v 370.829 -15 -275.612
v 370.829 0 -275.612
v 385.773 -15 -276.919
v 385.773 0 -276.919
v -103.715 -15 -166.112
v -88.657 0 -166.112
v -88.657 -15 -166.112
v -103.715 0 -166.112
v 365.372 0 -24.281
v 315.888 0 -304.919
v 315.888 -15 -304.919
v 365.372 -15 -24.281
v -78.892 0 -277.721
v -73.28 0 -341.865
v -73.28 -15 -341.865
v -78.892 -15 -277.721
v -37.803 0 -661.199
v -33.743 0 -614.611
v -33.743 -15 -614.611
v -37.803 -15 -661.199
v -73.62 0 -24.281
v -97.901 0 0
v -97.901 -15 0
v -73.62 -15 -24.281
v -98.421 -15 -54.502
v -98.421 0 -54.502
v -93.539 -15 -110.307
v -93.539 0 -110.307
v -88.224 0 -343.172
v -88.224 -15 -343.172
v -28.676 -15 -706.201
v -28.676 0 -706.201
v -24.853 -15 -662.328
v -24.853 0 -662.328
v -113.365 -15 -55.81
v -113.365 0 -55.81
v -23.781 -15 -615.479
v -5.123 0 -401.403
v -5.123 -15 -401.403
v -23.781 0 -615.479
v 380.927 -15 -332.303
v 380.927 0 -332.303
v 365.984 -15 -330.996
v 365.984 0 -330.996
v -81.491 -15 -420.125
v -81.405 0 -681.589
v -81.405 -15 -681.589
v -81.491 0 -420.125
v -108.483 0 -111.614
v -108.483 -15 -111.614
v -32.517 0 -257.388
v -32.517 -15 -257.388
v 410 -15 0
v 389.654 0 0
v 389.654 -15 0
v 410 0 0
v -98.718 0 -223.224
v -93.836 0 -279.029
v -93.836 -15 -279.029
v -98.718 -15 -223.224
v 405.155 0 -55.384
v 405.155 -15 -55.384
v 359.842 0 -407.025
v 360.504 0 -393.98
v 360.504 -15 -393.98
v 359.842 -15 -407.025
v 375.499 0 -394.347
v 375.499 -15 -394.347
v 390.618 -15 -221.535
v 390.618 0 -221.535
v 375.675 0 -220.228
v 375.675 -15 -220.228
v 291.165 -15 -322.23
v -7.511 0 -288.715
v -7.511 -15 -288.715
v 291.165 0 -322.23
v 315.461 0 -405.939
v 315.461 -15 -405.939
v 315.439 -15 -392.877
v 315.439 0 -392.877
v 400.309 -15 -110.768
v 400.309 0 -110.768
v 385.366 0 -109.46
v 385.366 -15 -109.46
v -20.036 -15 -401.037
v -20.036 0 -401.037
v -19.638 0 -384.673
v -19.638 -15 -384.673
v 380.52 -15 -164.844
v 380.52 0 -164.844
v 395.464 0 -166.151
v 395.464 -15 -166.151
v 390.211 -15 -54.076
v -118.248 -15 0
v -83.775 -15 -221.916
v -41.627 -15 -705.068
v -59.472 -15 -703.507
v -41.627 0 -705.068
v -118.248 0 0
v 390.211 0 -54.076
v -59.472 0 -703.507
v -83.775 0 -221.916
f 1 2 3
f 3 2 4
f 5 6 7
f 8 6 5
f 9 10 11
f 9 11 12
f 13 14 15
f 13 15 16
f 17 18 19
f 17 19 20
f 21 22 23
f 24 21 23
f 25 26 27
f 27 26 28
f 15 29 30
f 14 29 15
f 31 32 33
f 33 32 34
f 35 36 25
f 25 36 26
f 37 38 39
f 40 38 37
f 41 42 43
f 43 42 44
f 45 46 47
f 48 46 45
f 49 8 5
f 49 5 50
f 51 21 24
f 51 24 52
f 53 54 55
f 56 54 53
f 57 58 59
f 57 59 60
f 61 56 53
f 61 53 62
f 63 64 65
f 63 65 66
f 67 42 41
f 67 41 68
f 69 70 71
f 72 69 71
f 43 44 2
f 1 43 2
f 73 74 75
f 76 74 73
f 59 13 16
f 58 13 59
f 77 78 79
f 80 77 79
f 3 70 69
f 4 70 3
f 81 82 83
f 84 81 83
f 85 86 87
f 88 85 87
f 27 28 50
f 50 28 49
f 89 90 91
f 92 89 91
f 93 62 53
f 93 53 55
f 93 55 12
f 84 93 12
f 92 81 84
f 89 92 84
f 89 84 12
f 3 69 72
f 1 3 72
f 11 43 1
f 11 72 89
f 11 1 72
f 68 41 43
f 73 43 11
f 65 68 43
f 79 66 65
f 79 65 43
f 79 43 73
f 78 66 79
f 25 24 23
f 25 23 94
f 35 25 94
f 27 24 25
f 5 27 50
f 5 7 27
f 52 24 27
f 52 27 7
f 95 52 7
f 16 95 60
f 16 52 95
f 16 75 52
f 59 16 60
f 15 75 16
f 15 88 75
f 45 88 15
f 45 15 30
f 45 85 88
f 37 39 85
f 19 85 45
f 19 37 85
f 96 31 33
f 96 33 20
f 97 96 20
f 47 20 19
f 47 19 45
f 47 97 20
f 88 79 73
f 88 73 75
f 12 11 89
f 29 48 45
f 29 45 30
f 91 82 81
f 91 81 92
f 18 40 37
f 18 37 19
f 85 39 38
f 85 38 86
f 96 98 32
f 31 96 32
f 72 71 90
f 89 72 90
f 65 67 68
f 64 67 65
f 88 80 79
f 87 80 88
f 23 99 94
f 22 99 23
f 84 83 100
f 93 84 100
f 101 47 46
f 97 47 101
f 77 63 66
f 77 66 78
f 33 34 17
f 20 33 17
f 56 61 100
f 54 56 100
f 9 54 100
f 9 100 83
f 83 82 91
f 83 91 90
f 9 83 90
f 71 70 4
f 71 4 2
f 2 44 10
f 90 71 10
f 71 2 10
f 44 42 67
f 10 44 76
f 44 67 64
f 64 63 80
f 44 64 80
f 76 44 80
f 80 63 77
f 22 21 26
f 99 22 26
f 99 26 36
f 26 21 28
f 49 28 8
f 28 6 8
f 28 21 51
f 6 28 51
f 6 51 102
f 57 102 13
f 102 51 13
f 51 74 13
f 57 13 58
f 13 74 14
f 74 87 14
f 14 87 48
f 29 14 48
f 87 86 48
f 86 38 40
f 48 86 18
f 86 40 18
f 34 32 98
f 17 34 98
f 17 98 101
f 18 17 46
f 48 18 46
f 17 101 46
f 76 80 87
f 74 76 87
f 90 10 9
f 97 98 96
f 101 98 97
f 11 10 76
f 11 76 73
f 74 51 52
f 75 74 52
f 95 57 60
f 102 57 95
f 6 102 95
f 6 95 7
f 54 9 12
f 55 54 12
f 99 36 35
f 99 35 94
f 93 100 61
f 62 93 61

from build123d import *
from OCP.BRepFilletAPI import BRepFilletAPI_MakeChamfer

# Parameters (mm, degrees)
BOSS_EXTRUDE1_DEPTH = 15
CUT_EXTRUDE2_DEPTH  = 816.748946497
BOSS_EXTRUDE2_DEPTH = 15
BOSS_EXTRUDE3_DEPTH = 15
CHAMFER1_SIZE       = 20
CHAMFER1_SIZE2      = 22.009925117
CHAMFER2_SIZE       = 20
CHAMFER2_SIZE2      = 21.383906801
CHAMFER2_SIZE2_2    = 29.545676359
CHAMFER3_SIZE       = 20
CHAMFER3_SIZE2      = 24.656061036
CUT_EXTRUDE3_DEPTH  = 817.728441489


with BuildPart() as part:
    # Sketch3 → Boss-Extrude1 (new body)
    with BuildSketch(Plane(origin=(0, 0, 0), x_dir=(1, 0, 0), z_dir=(0, 1, 0))):
        Polygon((410, 0), (375.499079338, 394.347327661), (-3.698775856, 385.063270846), (-23.780817684, 615.47886016), (-33.743052085, 614.610594222), (-41.626962847, 705.068325562), (-61.474466641, 703.331893981), (-81.398360603, 701.588779126), (-81.491356741, 420.124681698), (-118.247503657, 0), (-77.901012172, 0), (-27.385966046, 286.485062711), (312.415130717, 324.614971391), (369.653508515, 0), align=None)
    extrude(amount=-BOSS_EXTRUDE1_DEPTH)

    # Sketch4 → Cut-Extrude2 (cut, through all)
    with BuildSketch(Plane(origin=(0, 0, 0), x_dir=(1, 0, 0), z_dir=(0, 1, 0))):
        Polygon((-20.036108533, 401.037382744), (-19.638496356, 384.673012123), (-3.698775856, 385.063270846), (-5.122834429, 401.402510558), align=None)
    extrude(amount=-CUT_EXTRUDE2_DEPTH, mode=Mode.SUBTRACT)

    # Sketch5 → Boss-Extrude2 (add)
    with BuildSketch(Plane(origin=(0, 0, 0), x_dir=(1, 0, 0), z_dir=(0, 1, 0))):
        Polygon((-41.626962847, 705.068325562), (-28.676431065, 706.20135028), (-24.852581449, 662.327596289), (-37.80348617, 661.198850569), align=None)
    extrude(amount=-BOSS_EXTRUDE2_DEPTH)

    # Sketch6 → Boss-Extrude3 (add)
    with BuildSketch(Plane(origin=(0, 0, 0), x_dir=(1, 0, 0), z_dir=(0, 1, 0))):
        Polygon((315.438962688, 392.87685116), (360.503573098, 393.980186523), (359.842168491, 407.025169305), (315.461186161, 405.938571489), align=None)
    extrude(amount=-BOSS_EXTRUDE3_DEPTH)

    # Chamfer1
    chamfer1_edges = [part.edges().sort_by_distance(p)[0] for p in [
        (-81.398360603, -7.5, -701.588779126),
    ]]
    chamfer1_side = [part.faces().sort_by_distance(p)[0] for p in [
        (-81.444858672, -7.5, -560.856730412),
    ]]
    chamfer(chamfer1_edges, length=CHAMFER1_SIZE, length2=CHAMFER1_SIZE2, reference=chamfer1_side[0])

    # Chamfer2: one chamfer whose edges measure the first distance from different faces: ONE call of the kernel's chamfer builder (chamfer() names one face for all edges)
    chamfer2_edges_1 = [part.edges().sort_by_distance(p)[0] for p in [
        (312.415130717, -7.5, -324.614971391),
    ]]
    chamfer2_side_1 = [part.faces().sort_by_distance(p)[0] for p in [
        (341.034319616, -7.5, -162.307485695),
    ]]
    chamfer2_edges_2 = [part.edges().sort_by_distance(p)[0] for p in [
        (-27.385966046, -7.5, -286.485062711),
    ]]
    chamfer2_side_2 = [part.faces().sort_by_distance(p)[0] for p in [
        (142.514582336, -7.5, -305.550017051),
    ]]
    chamfer2 = BRepFilletAPI_MakeChamfer(part.part.solid().wrapped)
    for e in chamfer2_edges_1:
        chamfer2.Add(CHAMFER2_SIZE, CHAMFER2_SIZE2, e.wrapped, chamfer2_side_1[0].wrapped)  # the first distance lies on this face
    for e in chamfer2_edges_2:
        chamfer2.Add(CHAMFER2_SIZE, CHAMFER2_SIZE2_2, e.wrapped, chamfer2_side_2[0].wrapped)  # the first distance lies on this face
    add(Compound.cast(chamfer2.Shape()), mode=Mode.REPLACE)

    # Chamfer3: one chamfer whose edges measure the first distance from different faces: ONE call of the kernel's chamfer builder (chamfer() names one face for all edges)
    chamfer3_edges_1 = [part.edges().sort_by_distance(p)[0] for p in [
        (369.653508515, -7.5, 0),
    ]]
    chamfer3_side_1 = [part.faces().sort_by_distance(p)[0] for p in [
        (389.826754258, -7.5, 0),
    ]]
    chamfer3_edges_2 = [part.edges().sort_by_distance(p)[0] for p in [
        (-77.901012172, -7.5, 0),
    ]]
    chamfer3_side_2 = [part.faces().sort_by_distance(p)[0] for p in [
        (-98.074257914, -7.5, 0),
    ]]
    chamfer3 = BRepFilletAPI_MakeChamfer(part.part.solid().wrapped)
    for e in chamfer3_edges_1:
        chamfer3.Add(CHAMFER3_SIZE, CHAMFER3_SIZE2, e.wrapped, chamfer3_side_1[0].wrapped)  # the first distance lies on this face
    for e in chamfer3_edges_2:
        chamfer3.Add(CHAMFER3_SIZE, CHAMFER3_SIZE2, e.wrapped, chamfer3_side_2[0].wrapped)  # the first distance lies on this face
    add(Compound.cast(chamfer3.Shape()), mode=Mode.REPLACE)

    # Sketch9 → Cut-Extrude3 (cut, through all)
    with BuildSketch(Plane(origin=(0, 0, 0), x_dir=(1, 0, 0), z_dir=(0, 1, 0))):
        Polygon((-73.280468193, 341.864865291), (-78.892311228, 277.721205877), (-93.835666105, 279.028580024), (-88.223823069, 343.172239438), align=None)
        Polygon((-98.717946571, 223.223858938), (-83.774591695, 221.916484791), (-88.656865511, 166.111839714), (-103.714600804, 166.111839714), align=None)
        Polygon((-93.539152627, 110.307042618), (-108.482507504, 111.614416765), (-113.36478797, 55.809695678), (-98.421433094, 54.502321532), align=None)
        Polygon((380.927264722, 332.302884814), (365.983909846, 330.995510667), (370.829365725, 275.611696532), (385.772720602, 276.919070678), align=None)
        Polygon((390.618176481, 221.535256543), (375.674821605, 220.227882396), (380.520277485, 164.84406826), (395.463632361, 166.151442407), align=None)
        Polygon((385.365733364, 109.460254125), (390.211189244, 54.076439989), (405.15454412, 55.383814136), (400.309088241, 110.767628271), align=None)
    extrude(amount=-CUT_EXTRUDE3_DEPTH, mode=Mode.SUBTRACT)


solid = part.part
